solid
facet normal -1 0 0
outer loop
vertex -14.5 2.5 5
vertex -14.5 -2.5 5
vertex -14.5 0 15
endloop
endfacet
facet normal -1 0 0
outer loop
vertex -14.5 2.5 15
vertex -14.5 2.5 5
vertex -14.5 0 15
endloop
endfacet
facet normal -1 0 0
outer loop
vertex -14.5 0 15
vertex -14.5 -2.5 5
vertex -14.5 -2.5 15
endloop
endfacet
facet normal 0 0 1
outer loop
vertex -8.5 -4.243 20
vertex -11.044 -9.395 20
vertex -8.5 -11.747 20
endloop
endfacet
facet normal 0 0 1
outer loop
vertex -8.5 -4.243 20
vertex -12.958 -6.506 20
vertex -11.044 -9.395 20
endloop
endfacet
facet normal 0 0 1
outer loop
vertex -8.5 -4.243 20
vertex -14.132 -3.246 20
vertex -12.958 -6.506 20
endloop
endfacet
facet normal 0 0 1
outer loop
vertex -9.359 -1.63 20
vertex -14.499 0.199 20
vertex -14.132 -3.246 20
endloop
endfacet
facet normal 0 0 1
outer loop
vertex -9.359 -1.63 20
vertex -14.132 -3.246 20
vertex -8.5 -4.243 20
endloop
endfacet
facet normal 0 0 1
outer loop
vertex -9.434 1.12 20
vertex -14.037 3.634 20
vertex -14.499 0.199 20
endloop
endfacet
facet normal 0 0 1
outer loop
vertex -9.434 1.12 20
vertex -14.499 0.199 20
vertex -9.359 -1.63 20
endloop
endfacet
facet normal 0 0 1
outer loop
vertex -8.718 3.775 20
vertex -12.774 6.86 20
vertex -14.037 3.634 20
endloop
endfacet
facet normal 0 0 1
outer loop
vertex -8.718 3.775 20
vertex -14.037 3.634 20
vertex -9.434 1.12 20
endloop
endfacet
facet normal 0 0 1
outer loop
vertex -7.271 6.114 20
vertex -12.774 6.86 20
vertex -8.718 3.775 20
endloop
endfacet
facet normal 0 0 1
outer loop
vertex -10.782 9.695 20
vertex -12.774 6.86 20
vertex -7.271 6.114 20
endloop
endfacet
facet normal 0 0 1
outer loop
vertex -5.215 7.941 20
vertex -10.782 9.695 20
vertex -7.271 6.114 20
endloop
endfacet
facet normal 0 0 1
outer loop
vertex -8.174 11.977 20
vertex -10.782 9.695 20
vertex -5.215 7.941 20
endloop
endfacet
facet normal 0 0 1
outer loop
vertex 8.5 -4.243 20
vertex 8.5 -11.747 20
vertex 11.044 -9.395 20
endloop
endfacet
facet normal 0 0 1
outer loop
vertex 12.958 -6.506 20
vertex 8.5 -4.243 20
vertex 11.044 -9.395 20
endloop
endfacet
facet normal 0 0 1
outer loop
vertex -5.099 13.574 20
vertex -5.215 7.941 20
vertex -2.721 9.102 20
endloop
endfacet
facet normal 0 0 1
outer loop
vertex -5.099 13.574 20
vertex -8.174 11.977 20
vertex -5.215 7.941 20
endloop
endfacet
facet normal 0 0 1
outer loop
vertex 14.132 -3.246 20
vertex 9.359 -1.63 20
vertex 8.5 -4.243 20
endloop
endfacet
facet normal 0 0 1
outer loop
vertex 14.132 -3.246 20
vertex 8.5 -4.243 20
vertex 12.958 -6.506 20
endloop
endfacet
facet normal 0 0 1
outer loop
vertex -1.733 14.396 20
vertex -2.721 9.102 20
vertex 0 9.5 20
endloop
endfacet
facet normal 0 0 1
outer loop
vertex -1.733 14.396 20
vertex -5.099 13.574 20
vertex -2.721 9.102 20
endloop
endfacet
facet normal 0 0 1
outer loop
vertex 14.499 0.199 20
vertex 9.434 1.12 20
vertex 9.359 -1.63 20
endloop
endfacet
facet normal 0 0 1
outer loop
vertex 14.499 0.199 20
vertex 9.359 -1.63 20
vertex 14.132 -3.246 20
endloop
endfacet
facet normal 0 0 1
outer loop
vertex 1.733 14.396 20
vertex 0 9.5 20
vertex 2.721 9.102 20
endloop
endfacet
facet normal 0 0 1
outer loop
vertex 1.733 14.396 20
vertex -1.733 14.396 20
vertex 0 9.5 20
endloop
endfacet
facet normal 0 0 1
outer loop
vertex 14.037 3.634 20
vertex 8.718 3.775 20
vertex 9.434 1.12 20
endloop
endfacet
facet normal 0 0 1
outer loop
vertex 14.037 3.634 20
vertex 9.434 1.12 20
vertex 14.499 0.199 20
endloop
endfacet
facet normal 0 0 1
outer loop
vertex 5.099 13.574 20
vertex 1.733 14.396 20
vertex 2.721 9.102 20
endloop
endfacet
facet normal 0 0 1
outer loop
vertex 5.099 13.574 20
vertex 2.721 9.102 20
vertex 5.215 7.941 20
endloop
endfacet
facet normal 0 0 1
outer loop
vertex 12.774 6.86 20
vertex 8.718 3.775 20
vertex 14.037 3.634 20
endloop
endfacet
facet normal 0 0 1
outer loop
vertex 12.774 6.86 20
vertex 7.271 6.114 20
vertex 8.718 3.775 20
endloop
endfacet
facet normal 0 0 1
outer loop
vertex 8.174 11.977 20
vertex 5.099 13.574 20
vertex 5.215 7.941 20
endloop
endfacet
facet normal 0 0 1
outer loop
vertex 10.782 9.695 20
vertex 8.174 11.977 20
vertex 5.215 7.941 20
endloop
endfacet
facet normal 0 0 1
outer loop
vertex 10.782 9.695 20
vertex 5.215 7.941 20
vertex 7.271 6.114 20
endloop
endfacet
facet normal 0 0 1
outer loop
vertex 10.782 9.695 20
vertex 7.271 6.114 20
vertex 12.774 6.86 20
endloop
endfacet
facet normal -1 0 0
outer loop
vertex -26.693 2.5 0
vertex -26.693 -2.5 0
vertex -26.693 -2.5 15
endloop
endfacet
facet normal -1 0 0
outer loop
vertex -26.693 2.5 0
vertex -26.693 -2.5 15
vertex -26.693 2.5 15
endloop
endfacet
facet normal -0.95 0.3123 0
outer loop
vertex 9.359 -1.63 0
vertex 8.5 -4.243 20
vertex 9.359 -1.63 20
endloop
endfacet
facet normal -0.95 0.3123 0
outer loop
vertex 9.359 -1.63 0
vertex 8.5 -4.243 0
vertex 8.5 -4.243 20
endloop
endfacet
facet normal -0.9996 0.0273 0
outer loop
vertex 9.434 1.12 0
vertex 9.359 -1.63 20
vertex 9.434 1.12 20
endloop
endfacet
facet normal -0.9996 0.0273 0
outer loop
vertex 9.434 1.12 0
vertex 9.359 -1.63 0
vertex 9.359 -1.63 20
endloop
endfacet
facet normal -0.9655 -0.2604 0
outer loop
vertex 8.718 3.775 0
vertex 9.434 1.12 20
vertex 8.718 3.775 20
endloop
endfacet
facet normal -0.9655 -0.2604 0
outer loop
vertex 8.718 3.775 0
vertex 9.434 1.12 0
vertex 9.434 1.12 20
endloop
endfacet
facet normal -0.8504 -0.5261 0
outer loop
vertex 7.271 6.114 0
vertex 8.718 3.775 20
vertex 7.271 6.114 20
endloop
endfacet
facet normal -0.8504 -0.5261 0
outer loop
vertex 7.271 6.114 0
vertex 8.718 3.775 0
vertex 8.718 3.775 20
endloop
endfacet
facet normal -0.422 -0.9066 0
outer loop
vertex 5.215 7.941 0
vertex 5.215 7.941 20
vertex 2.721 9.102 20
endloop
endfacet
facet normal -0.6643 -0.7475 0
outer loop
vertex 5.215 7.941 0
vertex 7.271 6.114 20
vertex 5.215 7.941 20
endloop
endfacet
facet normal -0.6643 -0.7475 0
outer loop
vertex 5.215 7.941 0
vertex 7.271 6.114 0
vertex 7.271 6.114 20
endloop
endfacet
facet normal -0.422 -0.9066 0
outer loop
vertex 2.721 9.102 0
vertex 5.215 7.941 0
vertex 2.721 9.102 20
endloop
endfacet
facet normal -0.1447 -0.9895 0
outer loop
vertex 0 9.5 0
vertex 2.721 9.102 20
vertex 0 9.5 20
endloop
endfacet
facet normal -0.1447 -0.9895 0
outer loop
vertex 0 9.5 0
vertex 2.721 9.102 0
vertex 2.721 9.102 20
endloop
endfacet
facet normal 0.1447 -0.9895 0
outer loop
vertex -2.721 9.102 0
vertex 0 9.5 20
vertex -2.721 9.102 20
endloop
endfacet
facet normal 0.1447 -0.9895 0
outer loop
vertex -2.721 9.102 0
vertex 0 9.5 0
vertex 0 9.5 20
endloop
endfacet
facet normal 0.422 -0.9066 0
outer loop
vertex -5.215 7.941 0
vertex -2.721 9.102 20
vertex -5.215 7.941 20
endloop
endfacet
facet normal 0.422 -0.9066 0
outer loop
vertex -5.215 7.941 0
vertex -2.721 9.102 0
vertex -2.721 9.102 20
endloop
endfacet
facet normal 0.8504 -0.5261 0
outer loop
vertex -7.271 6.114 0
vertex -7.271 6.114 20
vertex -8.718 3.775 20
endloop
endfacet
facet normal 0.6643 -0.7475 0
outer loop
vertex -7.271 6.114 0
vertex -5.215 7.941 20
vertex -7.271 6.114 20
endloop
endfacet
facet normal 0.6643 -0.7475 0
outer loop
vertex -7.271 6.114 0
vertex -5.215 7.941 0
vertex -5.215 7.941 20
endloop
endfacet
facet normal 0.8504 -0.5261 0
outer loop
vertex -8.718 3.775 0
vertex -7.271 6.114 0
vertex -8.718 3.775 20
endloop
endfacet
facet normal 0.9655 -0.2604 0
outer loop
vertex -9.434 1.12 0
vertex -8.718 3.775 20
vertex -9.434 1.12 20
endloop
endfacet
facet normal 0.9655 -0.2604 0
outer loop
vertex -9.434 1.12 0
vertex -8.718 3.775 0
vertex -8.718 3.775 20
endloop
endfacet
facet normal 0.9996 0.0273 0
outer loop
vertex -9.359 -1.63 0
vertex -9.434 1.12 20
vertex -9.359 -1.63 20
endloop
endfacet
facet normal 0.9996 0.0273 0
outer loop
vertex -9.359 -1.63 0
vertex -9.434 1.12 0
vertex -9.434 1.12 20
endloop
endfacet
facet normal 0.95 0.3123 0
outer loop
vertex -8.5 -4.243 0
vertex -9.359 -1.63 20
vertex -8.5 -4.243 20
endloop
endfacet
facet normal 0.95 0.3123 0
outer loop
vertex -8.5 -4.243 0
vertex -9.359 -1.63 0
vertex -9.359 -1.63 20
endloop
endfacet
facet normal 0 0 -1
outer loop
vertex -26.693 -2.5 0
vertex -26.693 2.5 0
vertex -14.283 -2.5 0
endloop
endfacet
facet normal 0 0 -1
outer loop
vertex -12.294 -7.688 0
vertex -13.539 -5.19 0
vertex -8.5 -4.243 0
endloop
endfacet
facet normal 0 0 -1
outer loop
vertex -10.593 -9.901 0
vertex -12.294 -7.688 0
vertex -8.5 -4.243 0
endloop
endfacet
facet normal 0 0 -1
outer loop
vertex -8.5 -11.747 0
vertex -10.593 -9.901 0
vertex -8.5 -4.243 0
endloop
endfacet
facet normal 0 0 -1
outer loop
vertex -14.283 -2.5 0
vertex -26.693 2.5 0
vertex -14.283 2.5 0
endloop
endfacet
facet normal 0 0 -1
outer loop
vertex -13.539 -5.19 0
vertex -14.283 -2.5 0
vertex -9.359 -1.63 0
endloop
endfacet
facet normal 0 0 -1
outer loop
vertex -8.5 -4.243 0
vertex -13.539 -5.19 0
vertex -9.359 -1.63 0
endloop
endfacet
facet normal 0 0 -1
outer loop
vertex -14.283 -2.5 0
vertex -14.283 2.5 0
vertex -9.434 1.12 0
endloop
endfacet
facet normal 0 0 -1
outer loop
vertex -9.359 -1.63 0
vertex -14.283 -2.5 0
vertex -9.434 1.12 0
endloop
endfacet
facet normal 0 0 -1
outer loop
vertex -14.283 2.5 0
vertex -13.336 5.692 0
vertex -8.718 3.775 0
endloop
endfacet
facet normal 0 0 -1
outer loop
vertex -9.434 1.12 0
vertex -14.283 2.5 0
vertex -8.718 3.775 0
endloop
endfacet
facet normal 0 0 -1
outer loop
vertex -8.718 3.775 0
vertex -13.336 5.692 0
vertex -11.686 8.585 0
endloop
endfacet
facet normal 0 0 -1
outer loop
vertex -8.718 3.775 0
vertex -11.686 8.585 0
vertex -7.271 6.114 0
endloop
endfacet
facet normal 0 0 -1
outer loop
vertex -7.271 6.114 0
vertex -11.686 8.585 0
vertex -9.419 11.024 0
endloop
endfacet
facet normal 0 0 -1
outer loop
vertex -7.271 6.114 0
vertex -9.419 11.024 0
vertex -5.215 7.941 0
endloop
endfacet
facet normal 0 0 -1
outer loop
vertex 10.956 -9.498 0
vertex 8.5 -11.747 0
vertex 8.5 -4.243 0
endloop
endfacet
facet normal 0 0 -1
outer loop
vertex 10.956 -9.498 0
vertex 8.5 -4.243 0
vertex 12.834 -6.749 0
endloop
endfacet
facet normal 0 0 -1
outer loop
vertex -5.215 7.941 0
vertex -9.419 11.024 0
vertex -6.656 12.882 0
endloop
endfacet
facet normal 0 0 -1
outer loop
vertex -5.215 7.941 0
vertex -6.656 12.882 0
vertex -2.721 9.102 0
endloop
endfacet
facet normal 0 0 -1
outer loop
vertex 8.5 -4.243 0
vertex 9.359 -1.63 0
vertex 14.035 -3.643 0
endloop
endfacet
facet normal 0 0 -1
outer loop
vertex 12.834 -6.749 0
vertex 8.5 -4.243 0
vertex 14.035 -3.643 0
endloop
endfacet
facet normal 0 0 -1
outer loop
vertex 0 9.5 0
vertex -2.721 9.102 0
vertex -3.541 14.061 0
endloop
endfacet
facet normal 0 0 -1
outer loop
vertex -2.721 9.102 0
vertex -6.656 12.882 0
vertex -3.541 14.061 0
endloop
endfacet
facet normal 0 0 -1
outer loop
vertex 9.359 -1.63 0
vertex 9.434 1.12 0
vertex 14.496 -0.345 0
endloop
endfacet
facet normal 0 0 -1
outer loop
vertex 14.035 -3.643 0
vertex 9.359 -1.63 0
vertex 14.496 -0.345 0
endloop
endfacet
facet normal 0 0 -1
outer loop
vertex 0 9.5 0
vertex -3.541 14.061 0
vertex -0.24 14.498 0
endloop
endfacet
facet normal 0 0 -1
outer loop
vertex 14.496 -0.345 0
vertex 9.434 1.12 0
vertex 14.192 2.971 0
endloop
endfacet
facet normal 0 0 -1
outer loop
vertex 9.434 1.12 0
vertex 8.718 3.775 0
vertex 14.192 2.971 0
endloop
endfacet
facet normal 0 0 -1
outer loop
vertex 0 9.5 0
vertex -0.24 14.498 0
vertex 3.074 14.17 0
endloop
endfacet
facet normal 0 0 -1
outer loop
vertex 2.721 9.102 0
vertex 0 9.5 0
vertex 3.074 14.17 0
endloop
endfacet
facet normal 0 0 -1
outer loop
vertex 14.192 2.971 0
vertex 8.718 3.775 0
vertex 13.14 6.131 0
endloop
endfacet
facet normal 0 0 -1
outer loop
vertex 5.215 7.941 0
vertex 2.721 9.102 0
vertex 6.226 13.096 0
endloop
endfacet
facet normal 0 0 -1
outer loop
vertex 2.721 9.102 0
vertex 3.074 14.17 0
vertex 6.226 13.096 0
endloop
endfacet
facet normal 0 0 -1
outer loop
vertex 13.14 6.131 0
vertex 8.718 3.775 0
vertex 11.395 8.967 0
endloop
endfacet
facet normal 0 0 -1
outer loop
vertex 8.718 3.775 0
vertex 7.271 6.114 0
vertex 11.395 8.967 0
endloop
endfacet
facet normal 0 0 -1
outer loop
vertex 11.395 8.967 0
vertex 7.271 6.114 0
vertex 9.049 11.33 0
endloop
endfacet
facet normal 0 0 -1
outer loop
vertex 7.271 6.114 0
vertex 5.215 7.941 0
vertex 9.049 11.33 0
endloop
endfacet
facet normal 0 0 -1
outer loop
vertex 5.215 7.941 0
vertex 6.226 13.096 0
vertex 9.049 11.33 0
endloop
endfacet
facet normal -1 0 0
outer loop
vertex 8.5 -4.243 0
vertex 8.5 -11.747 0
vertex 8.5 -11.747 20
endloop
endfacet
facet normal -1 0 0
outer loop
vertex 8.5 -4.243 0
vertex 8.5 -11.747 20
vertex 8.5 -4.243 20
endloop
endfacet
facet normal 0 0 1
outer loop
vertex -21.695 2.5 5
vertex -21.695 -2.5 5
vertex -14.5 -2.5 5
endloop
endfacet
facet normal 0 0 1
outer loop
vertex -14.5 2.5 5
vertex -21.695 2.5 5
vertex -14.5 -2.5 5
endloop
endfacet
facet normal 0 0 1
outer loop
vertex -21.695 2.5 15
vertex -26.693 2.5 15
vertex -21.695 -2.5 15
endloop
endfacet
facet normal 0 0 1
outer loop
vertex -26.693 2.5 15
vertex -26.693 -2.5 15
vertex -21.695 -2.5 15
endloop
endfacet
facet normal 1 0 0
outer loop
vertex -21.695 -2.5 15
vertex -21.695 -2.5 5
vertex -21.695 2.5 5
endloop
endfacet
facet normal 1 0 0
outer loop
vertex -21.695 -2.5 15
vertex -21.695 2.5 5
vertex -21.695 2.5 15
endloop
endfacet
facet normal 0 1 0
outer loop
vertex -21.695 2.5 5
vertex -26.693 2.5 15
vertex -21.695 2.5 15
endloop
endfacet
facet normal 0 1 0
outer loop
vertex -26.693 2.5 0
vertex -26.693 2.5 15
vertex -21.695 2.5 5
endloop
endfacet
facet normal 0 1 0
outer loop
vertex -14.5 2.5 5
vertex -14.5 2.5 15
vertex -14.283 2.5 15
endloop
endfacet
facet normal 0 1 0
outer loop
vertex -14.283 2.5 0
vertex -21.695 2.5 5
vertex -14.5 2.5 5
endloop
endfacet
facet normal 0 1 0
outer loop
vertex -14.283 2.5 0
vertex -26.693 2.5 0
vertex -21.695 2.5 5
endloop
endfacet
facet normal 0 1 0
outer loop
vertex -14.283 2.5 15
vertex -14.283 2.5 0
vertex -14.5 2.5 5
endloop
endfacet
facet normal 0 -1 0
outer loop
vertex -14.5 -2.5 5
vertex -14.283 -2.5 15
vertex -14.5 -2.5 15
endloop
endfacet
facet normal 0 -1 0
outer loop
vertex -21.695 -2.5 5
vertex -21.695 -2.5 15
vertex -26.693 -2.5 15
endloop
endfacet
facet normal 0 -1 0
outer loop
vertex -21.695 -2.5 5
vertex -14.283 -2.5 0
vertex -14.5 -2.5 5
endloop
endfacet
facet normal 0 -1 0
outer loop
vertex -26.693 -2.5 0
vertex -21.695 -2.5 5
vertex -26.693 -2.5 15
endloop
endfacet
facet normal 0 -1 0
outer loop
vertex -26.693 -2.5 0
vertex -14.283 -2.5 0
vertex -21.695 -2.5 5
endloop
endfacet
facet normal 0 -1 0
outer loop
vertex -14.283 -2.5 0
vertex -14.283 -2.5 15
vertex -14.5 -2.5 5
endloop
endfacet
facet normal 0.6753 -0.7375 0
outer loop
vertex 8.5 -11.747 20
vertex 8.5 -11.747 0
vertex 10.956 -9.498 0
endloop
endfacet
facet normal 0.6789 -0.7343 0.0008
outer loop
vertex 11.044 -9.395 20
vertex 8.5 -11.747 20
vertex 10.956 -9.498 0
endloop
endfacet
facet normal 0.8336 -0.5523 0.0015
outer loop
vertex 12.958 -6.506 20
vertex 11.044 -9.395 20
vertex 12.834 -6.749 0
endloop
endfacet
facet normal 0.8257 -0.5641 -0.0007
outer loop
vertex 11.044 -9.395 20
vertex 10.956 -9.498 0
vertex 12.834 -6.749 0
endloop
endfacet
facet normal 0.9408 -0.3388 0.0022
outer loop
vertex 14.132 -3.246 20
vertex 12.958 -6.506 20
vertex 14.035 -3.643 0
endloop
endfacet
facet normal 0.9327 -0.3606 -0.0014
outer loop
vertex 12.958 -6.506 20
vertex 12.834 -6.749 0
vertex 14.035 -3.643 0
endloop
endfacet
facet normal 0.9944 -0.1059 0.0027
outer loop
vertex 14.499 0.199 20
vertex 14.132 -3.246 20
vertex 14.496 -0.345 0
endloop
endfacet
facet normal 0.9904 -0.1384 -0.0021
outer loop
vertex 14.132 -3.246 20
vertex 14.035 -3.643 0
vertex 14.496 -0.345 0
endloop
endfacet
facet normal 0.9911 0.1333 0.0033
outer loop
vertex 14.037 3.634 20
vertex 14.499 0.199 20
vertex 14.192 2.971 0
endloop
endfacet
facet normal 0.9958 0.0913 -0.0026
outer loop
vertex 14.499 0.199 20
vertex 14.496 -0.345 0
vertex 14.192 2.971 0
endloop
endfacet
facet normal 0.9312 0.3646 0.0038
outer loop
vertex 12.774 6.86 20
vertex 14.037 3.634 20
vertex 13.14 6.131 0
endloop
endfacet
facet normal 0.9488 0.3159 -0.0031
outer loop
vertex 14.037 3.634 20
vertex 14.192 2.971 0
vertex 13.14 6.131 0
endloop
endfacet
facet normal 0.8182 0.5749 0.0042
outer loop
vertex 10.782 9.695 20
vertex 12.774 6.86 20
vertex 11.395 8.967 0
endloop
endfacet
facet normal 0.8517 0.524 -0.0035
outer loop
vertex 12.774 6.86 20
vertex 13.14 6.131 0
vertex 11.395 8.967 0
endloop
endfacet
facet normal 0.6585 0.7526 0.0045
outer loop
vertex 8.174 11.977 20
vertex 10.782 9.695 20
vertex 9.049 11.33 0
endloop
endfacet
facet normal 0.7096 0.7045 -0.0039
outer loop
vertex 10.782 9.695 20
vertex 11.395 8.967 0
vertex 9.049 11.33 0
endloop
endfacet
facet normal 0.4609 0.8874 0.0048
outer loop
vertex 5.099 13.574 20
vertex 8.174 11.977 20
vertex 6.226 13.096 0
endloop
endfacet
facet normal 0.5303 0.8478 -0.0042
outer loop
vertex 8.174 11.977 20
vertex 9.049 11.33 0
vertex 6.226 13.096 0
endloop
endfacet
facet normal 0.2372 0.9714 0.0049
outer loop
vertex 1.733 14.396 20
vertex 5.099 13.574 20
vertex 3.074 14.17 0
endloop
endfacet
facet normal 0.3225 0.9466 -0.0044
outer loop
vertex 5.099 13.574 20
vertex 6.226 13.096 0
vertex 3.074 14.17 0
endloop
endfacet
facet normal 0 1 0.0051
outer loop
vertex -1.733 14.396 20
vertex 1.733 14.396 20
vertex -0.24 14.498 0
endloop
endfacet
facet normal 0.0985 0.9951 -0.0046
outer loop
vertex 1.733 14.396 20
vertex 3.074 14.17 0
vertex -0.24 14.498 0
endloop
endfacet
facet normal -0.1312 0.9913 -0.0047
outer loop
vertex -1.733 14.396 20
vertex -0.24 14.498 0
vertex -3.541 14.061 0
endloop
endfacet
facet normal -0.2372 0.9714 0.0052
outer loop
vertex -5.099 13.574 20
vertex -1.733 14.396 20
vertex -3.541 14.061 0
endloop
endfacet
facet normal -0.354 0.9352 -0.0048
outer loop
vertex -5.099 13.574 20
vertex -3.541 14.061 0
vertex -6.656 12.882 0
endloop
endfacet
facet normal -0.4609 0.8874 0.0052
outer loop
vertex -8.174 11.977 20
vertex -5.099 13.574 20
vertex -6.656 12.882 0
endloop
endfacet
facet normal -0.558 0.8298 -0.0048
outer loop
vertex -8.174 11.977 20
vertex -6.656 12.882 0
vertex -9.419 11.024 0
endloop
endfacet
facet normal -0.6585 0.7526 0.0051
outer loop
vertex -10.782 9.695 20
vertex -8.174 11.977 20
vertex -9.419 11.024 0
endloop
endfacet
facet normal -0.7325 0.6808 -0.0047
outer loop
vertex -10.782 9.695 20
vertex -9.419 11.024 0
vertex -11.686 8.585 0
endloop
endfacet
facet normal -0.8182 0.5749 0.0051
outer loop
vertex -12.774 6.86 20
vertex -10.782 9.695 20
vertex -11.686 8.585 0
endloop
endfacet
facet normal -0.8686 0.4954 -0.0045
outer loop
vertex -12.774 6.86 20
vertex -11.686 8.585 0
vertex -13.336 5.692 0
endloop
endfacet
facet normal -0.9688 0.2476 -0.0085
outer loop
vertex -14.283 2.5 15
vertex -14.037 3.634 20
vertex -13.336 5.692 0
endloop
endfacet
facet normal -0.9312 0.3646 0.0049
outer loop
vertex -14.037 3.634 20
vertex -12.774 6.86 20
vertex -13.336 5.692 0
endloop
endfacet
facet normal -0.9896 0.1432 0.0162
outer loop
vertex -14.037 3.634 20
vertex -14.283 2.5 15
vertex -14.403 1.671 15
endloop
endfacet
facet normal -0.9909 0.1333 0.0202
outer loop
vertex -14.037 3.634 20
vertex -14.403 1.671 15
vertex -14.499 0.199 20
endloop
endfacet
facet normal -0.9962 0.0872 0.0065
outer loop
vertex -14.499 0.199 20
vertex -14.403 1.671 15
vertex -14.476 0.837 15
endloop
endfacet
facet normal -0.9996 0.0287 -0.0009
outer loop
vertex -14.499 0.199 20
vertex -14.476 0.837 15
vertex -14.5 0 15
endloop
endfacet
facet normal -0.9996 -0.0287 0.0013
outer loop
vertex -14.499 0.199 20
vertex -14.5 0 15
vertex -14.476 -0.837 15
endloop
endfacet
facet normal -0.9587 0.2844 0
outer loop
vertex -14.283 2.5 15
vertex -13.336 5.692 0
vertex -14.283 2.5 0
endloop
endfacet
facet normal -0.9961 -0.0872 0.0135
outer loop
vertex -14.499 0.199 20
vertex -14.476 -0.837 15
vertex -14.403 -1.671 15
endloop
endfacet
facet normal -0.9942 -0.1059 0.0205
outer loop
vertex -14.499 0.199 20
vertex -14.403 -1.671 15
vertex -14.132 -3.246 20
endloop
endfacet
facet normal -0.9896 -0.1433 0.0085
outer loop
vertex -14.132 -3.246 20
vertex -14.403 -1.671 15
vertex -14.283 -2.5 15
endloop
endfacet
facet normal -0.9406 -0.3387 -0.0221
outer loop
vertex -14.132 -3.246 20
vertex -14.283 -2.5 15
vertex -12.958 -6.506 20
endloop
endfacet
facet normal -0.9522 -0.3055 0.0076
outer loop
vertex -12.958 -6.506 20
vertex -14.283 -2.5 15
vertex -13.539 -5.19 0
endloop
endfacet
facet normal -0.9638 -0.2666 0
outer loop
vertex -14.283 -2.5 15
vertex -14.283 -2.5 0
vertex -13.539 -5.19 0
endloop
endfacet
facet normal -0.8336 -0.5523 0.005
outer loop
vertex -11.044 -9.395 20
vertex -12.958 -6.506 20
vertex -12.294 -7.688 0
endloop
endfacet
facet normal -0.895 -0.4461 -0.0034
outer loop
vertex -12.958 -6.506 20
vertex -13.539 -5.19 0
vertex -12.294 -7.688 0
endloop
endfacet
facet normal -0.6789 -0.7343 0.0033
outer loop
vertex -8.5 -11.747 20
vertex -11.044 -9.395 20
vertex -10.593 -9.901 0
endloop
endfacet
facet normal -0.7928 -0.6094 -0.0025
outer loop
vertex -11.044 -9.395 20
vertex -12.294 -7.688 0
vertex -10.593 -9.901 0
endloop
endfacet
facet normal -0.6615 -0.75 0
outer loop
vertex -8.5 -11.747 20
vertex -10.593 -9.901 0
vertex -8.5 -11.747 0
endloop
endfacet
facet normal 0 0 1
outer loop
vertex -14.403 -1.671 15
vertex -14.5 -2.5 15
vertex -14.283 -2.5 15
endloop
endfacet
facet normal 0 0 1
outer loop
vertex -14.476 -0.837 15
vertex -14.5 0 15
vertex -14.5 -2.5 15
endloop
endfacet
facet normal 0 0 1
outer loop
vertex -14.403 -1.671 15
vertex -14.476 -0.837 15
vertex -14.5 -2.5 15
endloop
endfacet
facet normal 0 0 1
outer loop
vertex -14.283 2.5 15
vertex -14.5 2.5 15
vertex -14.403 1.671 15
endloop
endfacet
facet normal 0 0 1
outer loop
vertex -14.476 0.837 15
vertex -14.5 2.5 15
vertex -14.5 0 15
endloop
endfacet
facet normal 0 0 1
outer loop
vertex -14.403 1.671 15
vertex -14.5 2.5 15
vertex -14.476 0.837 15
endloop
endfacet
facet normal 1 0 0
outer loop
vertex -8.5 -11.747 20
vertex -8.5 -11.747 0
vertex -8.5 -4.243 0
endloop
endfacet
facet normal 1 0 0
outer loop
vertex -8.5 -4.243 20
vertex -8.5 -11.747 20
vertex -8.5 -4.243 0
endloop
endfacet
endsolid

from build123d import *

# Parameters (mm, degrees)
F0_R     = 14.5
F0_R_2   = 9.5
F1_DEPTH = 20
F2_W     = 17
F2_H     = 20.348274
F3_DEPTH = 20
F5_DEPTH = 15
F6_W     = 7.194839
F6_H     = 10
F7_DEPTH = 5


with BuildPart() as f1:
    # F0 (on Top) → F1 (new body)
    with BuildSketch(Plane.XY):
        Circle(F0_R)
        Circle(F0_R_2, mode=Mode.SUBTRACT)
    extrude(amount=F1_DEPTH)

    # F2 (on Top) → F3 (cut)
    with BuildSketch(Plane.XY):
        with Locations((0, -10.174137)):
            Rectangle(F2_W, F2_H)
    extrude(amount=F3_DEPTH, mode=Mode.SUBTRACT)

    # F4 (on face) → F5 (join)
    with BuildSketch(Plane(origin=(0, 0, 0), x_dir=(1, 0, 0), z_dir=(0, 0, -1))):
        with BuildLine():
            ThreePointArc((-14.282857, -2.5), (-14.5, 0), (-14.282857, 2.5))
            Line((-14.282857, 2.5), (-26.692857, 2.5))
            Line((-26.692857, 2.5), (-26.692857, -2.5))
            Line((-26.692857, -2.5), (-14.282857, -2.5))
        make_face()
    extrude(amount=-F5_DEPTH)

    # F6 (on face) → F7 (cut)
    with BuildSketch(Plane.XZ.offset(2.5)):
        with Locations((-18.09742, 10)):
            Rectangle(F6_W, F6_H)
    extrude(amount=-F7_DEPTH, mode=Mode.SUBTRACT)


solid = f1.part
